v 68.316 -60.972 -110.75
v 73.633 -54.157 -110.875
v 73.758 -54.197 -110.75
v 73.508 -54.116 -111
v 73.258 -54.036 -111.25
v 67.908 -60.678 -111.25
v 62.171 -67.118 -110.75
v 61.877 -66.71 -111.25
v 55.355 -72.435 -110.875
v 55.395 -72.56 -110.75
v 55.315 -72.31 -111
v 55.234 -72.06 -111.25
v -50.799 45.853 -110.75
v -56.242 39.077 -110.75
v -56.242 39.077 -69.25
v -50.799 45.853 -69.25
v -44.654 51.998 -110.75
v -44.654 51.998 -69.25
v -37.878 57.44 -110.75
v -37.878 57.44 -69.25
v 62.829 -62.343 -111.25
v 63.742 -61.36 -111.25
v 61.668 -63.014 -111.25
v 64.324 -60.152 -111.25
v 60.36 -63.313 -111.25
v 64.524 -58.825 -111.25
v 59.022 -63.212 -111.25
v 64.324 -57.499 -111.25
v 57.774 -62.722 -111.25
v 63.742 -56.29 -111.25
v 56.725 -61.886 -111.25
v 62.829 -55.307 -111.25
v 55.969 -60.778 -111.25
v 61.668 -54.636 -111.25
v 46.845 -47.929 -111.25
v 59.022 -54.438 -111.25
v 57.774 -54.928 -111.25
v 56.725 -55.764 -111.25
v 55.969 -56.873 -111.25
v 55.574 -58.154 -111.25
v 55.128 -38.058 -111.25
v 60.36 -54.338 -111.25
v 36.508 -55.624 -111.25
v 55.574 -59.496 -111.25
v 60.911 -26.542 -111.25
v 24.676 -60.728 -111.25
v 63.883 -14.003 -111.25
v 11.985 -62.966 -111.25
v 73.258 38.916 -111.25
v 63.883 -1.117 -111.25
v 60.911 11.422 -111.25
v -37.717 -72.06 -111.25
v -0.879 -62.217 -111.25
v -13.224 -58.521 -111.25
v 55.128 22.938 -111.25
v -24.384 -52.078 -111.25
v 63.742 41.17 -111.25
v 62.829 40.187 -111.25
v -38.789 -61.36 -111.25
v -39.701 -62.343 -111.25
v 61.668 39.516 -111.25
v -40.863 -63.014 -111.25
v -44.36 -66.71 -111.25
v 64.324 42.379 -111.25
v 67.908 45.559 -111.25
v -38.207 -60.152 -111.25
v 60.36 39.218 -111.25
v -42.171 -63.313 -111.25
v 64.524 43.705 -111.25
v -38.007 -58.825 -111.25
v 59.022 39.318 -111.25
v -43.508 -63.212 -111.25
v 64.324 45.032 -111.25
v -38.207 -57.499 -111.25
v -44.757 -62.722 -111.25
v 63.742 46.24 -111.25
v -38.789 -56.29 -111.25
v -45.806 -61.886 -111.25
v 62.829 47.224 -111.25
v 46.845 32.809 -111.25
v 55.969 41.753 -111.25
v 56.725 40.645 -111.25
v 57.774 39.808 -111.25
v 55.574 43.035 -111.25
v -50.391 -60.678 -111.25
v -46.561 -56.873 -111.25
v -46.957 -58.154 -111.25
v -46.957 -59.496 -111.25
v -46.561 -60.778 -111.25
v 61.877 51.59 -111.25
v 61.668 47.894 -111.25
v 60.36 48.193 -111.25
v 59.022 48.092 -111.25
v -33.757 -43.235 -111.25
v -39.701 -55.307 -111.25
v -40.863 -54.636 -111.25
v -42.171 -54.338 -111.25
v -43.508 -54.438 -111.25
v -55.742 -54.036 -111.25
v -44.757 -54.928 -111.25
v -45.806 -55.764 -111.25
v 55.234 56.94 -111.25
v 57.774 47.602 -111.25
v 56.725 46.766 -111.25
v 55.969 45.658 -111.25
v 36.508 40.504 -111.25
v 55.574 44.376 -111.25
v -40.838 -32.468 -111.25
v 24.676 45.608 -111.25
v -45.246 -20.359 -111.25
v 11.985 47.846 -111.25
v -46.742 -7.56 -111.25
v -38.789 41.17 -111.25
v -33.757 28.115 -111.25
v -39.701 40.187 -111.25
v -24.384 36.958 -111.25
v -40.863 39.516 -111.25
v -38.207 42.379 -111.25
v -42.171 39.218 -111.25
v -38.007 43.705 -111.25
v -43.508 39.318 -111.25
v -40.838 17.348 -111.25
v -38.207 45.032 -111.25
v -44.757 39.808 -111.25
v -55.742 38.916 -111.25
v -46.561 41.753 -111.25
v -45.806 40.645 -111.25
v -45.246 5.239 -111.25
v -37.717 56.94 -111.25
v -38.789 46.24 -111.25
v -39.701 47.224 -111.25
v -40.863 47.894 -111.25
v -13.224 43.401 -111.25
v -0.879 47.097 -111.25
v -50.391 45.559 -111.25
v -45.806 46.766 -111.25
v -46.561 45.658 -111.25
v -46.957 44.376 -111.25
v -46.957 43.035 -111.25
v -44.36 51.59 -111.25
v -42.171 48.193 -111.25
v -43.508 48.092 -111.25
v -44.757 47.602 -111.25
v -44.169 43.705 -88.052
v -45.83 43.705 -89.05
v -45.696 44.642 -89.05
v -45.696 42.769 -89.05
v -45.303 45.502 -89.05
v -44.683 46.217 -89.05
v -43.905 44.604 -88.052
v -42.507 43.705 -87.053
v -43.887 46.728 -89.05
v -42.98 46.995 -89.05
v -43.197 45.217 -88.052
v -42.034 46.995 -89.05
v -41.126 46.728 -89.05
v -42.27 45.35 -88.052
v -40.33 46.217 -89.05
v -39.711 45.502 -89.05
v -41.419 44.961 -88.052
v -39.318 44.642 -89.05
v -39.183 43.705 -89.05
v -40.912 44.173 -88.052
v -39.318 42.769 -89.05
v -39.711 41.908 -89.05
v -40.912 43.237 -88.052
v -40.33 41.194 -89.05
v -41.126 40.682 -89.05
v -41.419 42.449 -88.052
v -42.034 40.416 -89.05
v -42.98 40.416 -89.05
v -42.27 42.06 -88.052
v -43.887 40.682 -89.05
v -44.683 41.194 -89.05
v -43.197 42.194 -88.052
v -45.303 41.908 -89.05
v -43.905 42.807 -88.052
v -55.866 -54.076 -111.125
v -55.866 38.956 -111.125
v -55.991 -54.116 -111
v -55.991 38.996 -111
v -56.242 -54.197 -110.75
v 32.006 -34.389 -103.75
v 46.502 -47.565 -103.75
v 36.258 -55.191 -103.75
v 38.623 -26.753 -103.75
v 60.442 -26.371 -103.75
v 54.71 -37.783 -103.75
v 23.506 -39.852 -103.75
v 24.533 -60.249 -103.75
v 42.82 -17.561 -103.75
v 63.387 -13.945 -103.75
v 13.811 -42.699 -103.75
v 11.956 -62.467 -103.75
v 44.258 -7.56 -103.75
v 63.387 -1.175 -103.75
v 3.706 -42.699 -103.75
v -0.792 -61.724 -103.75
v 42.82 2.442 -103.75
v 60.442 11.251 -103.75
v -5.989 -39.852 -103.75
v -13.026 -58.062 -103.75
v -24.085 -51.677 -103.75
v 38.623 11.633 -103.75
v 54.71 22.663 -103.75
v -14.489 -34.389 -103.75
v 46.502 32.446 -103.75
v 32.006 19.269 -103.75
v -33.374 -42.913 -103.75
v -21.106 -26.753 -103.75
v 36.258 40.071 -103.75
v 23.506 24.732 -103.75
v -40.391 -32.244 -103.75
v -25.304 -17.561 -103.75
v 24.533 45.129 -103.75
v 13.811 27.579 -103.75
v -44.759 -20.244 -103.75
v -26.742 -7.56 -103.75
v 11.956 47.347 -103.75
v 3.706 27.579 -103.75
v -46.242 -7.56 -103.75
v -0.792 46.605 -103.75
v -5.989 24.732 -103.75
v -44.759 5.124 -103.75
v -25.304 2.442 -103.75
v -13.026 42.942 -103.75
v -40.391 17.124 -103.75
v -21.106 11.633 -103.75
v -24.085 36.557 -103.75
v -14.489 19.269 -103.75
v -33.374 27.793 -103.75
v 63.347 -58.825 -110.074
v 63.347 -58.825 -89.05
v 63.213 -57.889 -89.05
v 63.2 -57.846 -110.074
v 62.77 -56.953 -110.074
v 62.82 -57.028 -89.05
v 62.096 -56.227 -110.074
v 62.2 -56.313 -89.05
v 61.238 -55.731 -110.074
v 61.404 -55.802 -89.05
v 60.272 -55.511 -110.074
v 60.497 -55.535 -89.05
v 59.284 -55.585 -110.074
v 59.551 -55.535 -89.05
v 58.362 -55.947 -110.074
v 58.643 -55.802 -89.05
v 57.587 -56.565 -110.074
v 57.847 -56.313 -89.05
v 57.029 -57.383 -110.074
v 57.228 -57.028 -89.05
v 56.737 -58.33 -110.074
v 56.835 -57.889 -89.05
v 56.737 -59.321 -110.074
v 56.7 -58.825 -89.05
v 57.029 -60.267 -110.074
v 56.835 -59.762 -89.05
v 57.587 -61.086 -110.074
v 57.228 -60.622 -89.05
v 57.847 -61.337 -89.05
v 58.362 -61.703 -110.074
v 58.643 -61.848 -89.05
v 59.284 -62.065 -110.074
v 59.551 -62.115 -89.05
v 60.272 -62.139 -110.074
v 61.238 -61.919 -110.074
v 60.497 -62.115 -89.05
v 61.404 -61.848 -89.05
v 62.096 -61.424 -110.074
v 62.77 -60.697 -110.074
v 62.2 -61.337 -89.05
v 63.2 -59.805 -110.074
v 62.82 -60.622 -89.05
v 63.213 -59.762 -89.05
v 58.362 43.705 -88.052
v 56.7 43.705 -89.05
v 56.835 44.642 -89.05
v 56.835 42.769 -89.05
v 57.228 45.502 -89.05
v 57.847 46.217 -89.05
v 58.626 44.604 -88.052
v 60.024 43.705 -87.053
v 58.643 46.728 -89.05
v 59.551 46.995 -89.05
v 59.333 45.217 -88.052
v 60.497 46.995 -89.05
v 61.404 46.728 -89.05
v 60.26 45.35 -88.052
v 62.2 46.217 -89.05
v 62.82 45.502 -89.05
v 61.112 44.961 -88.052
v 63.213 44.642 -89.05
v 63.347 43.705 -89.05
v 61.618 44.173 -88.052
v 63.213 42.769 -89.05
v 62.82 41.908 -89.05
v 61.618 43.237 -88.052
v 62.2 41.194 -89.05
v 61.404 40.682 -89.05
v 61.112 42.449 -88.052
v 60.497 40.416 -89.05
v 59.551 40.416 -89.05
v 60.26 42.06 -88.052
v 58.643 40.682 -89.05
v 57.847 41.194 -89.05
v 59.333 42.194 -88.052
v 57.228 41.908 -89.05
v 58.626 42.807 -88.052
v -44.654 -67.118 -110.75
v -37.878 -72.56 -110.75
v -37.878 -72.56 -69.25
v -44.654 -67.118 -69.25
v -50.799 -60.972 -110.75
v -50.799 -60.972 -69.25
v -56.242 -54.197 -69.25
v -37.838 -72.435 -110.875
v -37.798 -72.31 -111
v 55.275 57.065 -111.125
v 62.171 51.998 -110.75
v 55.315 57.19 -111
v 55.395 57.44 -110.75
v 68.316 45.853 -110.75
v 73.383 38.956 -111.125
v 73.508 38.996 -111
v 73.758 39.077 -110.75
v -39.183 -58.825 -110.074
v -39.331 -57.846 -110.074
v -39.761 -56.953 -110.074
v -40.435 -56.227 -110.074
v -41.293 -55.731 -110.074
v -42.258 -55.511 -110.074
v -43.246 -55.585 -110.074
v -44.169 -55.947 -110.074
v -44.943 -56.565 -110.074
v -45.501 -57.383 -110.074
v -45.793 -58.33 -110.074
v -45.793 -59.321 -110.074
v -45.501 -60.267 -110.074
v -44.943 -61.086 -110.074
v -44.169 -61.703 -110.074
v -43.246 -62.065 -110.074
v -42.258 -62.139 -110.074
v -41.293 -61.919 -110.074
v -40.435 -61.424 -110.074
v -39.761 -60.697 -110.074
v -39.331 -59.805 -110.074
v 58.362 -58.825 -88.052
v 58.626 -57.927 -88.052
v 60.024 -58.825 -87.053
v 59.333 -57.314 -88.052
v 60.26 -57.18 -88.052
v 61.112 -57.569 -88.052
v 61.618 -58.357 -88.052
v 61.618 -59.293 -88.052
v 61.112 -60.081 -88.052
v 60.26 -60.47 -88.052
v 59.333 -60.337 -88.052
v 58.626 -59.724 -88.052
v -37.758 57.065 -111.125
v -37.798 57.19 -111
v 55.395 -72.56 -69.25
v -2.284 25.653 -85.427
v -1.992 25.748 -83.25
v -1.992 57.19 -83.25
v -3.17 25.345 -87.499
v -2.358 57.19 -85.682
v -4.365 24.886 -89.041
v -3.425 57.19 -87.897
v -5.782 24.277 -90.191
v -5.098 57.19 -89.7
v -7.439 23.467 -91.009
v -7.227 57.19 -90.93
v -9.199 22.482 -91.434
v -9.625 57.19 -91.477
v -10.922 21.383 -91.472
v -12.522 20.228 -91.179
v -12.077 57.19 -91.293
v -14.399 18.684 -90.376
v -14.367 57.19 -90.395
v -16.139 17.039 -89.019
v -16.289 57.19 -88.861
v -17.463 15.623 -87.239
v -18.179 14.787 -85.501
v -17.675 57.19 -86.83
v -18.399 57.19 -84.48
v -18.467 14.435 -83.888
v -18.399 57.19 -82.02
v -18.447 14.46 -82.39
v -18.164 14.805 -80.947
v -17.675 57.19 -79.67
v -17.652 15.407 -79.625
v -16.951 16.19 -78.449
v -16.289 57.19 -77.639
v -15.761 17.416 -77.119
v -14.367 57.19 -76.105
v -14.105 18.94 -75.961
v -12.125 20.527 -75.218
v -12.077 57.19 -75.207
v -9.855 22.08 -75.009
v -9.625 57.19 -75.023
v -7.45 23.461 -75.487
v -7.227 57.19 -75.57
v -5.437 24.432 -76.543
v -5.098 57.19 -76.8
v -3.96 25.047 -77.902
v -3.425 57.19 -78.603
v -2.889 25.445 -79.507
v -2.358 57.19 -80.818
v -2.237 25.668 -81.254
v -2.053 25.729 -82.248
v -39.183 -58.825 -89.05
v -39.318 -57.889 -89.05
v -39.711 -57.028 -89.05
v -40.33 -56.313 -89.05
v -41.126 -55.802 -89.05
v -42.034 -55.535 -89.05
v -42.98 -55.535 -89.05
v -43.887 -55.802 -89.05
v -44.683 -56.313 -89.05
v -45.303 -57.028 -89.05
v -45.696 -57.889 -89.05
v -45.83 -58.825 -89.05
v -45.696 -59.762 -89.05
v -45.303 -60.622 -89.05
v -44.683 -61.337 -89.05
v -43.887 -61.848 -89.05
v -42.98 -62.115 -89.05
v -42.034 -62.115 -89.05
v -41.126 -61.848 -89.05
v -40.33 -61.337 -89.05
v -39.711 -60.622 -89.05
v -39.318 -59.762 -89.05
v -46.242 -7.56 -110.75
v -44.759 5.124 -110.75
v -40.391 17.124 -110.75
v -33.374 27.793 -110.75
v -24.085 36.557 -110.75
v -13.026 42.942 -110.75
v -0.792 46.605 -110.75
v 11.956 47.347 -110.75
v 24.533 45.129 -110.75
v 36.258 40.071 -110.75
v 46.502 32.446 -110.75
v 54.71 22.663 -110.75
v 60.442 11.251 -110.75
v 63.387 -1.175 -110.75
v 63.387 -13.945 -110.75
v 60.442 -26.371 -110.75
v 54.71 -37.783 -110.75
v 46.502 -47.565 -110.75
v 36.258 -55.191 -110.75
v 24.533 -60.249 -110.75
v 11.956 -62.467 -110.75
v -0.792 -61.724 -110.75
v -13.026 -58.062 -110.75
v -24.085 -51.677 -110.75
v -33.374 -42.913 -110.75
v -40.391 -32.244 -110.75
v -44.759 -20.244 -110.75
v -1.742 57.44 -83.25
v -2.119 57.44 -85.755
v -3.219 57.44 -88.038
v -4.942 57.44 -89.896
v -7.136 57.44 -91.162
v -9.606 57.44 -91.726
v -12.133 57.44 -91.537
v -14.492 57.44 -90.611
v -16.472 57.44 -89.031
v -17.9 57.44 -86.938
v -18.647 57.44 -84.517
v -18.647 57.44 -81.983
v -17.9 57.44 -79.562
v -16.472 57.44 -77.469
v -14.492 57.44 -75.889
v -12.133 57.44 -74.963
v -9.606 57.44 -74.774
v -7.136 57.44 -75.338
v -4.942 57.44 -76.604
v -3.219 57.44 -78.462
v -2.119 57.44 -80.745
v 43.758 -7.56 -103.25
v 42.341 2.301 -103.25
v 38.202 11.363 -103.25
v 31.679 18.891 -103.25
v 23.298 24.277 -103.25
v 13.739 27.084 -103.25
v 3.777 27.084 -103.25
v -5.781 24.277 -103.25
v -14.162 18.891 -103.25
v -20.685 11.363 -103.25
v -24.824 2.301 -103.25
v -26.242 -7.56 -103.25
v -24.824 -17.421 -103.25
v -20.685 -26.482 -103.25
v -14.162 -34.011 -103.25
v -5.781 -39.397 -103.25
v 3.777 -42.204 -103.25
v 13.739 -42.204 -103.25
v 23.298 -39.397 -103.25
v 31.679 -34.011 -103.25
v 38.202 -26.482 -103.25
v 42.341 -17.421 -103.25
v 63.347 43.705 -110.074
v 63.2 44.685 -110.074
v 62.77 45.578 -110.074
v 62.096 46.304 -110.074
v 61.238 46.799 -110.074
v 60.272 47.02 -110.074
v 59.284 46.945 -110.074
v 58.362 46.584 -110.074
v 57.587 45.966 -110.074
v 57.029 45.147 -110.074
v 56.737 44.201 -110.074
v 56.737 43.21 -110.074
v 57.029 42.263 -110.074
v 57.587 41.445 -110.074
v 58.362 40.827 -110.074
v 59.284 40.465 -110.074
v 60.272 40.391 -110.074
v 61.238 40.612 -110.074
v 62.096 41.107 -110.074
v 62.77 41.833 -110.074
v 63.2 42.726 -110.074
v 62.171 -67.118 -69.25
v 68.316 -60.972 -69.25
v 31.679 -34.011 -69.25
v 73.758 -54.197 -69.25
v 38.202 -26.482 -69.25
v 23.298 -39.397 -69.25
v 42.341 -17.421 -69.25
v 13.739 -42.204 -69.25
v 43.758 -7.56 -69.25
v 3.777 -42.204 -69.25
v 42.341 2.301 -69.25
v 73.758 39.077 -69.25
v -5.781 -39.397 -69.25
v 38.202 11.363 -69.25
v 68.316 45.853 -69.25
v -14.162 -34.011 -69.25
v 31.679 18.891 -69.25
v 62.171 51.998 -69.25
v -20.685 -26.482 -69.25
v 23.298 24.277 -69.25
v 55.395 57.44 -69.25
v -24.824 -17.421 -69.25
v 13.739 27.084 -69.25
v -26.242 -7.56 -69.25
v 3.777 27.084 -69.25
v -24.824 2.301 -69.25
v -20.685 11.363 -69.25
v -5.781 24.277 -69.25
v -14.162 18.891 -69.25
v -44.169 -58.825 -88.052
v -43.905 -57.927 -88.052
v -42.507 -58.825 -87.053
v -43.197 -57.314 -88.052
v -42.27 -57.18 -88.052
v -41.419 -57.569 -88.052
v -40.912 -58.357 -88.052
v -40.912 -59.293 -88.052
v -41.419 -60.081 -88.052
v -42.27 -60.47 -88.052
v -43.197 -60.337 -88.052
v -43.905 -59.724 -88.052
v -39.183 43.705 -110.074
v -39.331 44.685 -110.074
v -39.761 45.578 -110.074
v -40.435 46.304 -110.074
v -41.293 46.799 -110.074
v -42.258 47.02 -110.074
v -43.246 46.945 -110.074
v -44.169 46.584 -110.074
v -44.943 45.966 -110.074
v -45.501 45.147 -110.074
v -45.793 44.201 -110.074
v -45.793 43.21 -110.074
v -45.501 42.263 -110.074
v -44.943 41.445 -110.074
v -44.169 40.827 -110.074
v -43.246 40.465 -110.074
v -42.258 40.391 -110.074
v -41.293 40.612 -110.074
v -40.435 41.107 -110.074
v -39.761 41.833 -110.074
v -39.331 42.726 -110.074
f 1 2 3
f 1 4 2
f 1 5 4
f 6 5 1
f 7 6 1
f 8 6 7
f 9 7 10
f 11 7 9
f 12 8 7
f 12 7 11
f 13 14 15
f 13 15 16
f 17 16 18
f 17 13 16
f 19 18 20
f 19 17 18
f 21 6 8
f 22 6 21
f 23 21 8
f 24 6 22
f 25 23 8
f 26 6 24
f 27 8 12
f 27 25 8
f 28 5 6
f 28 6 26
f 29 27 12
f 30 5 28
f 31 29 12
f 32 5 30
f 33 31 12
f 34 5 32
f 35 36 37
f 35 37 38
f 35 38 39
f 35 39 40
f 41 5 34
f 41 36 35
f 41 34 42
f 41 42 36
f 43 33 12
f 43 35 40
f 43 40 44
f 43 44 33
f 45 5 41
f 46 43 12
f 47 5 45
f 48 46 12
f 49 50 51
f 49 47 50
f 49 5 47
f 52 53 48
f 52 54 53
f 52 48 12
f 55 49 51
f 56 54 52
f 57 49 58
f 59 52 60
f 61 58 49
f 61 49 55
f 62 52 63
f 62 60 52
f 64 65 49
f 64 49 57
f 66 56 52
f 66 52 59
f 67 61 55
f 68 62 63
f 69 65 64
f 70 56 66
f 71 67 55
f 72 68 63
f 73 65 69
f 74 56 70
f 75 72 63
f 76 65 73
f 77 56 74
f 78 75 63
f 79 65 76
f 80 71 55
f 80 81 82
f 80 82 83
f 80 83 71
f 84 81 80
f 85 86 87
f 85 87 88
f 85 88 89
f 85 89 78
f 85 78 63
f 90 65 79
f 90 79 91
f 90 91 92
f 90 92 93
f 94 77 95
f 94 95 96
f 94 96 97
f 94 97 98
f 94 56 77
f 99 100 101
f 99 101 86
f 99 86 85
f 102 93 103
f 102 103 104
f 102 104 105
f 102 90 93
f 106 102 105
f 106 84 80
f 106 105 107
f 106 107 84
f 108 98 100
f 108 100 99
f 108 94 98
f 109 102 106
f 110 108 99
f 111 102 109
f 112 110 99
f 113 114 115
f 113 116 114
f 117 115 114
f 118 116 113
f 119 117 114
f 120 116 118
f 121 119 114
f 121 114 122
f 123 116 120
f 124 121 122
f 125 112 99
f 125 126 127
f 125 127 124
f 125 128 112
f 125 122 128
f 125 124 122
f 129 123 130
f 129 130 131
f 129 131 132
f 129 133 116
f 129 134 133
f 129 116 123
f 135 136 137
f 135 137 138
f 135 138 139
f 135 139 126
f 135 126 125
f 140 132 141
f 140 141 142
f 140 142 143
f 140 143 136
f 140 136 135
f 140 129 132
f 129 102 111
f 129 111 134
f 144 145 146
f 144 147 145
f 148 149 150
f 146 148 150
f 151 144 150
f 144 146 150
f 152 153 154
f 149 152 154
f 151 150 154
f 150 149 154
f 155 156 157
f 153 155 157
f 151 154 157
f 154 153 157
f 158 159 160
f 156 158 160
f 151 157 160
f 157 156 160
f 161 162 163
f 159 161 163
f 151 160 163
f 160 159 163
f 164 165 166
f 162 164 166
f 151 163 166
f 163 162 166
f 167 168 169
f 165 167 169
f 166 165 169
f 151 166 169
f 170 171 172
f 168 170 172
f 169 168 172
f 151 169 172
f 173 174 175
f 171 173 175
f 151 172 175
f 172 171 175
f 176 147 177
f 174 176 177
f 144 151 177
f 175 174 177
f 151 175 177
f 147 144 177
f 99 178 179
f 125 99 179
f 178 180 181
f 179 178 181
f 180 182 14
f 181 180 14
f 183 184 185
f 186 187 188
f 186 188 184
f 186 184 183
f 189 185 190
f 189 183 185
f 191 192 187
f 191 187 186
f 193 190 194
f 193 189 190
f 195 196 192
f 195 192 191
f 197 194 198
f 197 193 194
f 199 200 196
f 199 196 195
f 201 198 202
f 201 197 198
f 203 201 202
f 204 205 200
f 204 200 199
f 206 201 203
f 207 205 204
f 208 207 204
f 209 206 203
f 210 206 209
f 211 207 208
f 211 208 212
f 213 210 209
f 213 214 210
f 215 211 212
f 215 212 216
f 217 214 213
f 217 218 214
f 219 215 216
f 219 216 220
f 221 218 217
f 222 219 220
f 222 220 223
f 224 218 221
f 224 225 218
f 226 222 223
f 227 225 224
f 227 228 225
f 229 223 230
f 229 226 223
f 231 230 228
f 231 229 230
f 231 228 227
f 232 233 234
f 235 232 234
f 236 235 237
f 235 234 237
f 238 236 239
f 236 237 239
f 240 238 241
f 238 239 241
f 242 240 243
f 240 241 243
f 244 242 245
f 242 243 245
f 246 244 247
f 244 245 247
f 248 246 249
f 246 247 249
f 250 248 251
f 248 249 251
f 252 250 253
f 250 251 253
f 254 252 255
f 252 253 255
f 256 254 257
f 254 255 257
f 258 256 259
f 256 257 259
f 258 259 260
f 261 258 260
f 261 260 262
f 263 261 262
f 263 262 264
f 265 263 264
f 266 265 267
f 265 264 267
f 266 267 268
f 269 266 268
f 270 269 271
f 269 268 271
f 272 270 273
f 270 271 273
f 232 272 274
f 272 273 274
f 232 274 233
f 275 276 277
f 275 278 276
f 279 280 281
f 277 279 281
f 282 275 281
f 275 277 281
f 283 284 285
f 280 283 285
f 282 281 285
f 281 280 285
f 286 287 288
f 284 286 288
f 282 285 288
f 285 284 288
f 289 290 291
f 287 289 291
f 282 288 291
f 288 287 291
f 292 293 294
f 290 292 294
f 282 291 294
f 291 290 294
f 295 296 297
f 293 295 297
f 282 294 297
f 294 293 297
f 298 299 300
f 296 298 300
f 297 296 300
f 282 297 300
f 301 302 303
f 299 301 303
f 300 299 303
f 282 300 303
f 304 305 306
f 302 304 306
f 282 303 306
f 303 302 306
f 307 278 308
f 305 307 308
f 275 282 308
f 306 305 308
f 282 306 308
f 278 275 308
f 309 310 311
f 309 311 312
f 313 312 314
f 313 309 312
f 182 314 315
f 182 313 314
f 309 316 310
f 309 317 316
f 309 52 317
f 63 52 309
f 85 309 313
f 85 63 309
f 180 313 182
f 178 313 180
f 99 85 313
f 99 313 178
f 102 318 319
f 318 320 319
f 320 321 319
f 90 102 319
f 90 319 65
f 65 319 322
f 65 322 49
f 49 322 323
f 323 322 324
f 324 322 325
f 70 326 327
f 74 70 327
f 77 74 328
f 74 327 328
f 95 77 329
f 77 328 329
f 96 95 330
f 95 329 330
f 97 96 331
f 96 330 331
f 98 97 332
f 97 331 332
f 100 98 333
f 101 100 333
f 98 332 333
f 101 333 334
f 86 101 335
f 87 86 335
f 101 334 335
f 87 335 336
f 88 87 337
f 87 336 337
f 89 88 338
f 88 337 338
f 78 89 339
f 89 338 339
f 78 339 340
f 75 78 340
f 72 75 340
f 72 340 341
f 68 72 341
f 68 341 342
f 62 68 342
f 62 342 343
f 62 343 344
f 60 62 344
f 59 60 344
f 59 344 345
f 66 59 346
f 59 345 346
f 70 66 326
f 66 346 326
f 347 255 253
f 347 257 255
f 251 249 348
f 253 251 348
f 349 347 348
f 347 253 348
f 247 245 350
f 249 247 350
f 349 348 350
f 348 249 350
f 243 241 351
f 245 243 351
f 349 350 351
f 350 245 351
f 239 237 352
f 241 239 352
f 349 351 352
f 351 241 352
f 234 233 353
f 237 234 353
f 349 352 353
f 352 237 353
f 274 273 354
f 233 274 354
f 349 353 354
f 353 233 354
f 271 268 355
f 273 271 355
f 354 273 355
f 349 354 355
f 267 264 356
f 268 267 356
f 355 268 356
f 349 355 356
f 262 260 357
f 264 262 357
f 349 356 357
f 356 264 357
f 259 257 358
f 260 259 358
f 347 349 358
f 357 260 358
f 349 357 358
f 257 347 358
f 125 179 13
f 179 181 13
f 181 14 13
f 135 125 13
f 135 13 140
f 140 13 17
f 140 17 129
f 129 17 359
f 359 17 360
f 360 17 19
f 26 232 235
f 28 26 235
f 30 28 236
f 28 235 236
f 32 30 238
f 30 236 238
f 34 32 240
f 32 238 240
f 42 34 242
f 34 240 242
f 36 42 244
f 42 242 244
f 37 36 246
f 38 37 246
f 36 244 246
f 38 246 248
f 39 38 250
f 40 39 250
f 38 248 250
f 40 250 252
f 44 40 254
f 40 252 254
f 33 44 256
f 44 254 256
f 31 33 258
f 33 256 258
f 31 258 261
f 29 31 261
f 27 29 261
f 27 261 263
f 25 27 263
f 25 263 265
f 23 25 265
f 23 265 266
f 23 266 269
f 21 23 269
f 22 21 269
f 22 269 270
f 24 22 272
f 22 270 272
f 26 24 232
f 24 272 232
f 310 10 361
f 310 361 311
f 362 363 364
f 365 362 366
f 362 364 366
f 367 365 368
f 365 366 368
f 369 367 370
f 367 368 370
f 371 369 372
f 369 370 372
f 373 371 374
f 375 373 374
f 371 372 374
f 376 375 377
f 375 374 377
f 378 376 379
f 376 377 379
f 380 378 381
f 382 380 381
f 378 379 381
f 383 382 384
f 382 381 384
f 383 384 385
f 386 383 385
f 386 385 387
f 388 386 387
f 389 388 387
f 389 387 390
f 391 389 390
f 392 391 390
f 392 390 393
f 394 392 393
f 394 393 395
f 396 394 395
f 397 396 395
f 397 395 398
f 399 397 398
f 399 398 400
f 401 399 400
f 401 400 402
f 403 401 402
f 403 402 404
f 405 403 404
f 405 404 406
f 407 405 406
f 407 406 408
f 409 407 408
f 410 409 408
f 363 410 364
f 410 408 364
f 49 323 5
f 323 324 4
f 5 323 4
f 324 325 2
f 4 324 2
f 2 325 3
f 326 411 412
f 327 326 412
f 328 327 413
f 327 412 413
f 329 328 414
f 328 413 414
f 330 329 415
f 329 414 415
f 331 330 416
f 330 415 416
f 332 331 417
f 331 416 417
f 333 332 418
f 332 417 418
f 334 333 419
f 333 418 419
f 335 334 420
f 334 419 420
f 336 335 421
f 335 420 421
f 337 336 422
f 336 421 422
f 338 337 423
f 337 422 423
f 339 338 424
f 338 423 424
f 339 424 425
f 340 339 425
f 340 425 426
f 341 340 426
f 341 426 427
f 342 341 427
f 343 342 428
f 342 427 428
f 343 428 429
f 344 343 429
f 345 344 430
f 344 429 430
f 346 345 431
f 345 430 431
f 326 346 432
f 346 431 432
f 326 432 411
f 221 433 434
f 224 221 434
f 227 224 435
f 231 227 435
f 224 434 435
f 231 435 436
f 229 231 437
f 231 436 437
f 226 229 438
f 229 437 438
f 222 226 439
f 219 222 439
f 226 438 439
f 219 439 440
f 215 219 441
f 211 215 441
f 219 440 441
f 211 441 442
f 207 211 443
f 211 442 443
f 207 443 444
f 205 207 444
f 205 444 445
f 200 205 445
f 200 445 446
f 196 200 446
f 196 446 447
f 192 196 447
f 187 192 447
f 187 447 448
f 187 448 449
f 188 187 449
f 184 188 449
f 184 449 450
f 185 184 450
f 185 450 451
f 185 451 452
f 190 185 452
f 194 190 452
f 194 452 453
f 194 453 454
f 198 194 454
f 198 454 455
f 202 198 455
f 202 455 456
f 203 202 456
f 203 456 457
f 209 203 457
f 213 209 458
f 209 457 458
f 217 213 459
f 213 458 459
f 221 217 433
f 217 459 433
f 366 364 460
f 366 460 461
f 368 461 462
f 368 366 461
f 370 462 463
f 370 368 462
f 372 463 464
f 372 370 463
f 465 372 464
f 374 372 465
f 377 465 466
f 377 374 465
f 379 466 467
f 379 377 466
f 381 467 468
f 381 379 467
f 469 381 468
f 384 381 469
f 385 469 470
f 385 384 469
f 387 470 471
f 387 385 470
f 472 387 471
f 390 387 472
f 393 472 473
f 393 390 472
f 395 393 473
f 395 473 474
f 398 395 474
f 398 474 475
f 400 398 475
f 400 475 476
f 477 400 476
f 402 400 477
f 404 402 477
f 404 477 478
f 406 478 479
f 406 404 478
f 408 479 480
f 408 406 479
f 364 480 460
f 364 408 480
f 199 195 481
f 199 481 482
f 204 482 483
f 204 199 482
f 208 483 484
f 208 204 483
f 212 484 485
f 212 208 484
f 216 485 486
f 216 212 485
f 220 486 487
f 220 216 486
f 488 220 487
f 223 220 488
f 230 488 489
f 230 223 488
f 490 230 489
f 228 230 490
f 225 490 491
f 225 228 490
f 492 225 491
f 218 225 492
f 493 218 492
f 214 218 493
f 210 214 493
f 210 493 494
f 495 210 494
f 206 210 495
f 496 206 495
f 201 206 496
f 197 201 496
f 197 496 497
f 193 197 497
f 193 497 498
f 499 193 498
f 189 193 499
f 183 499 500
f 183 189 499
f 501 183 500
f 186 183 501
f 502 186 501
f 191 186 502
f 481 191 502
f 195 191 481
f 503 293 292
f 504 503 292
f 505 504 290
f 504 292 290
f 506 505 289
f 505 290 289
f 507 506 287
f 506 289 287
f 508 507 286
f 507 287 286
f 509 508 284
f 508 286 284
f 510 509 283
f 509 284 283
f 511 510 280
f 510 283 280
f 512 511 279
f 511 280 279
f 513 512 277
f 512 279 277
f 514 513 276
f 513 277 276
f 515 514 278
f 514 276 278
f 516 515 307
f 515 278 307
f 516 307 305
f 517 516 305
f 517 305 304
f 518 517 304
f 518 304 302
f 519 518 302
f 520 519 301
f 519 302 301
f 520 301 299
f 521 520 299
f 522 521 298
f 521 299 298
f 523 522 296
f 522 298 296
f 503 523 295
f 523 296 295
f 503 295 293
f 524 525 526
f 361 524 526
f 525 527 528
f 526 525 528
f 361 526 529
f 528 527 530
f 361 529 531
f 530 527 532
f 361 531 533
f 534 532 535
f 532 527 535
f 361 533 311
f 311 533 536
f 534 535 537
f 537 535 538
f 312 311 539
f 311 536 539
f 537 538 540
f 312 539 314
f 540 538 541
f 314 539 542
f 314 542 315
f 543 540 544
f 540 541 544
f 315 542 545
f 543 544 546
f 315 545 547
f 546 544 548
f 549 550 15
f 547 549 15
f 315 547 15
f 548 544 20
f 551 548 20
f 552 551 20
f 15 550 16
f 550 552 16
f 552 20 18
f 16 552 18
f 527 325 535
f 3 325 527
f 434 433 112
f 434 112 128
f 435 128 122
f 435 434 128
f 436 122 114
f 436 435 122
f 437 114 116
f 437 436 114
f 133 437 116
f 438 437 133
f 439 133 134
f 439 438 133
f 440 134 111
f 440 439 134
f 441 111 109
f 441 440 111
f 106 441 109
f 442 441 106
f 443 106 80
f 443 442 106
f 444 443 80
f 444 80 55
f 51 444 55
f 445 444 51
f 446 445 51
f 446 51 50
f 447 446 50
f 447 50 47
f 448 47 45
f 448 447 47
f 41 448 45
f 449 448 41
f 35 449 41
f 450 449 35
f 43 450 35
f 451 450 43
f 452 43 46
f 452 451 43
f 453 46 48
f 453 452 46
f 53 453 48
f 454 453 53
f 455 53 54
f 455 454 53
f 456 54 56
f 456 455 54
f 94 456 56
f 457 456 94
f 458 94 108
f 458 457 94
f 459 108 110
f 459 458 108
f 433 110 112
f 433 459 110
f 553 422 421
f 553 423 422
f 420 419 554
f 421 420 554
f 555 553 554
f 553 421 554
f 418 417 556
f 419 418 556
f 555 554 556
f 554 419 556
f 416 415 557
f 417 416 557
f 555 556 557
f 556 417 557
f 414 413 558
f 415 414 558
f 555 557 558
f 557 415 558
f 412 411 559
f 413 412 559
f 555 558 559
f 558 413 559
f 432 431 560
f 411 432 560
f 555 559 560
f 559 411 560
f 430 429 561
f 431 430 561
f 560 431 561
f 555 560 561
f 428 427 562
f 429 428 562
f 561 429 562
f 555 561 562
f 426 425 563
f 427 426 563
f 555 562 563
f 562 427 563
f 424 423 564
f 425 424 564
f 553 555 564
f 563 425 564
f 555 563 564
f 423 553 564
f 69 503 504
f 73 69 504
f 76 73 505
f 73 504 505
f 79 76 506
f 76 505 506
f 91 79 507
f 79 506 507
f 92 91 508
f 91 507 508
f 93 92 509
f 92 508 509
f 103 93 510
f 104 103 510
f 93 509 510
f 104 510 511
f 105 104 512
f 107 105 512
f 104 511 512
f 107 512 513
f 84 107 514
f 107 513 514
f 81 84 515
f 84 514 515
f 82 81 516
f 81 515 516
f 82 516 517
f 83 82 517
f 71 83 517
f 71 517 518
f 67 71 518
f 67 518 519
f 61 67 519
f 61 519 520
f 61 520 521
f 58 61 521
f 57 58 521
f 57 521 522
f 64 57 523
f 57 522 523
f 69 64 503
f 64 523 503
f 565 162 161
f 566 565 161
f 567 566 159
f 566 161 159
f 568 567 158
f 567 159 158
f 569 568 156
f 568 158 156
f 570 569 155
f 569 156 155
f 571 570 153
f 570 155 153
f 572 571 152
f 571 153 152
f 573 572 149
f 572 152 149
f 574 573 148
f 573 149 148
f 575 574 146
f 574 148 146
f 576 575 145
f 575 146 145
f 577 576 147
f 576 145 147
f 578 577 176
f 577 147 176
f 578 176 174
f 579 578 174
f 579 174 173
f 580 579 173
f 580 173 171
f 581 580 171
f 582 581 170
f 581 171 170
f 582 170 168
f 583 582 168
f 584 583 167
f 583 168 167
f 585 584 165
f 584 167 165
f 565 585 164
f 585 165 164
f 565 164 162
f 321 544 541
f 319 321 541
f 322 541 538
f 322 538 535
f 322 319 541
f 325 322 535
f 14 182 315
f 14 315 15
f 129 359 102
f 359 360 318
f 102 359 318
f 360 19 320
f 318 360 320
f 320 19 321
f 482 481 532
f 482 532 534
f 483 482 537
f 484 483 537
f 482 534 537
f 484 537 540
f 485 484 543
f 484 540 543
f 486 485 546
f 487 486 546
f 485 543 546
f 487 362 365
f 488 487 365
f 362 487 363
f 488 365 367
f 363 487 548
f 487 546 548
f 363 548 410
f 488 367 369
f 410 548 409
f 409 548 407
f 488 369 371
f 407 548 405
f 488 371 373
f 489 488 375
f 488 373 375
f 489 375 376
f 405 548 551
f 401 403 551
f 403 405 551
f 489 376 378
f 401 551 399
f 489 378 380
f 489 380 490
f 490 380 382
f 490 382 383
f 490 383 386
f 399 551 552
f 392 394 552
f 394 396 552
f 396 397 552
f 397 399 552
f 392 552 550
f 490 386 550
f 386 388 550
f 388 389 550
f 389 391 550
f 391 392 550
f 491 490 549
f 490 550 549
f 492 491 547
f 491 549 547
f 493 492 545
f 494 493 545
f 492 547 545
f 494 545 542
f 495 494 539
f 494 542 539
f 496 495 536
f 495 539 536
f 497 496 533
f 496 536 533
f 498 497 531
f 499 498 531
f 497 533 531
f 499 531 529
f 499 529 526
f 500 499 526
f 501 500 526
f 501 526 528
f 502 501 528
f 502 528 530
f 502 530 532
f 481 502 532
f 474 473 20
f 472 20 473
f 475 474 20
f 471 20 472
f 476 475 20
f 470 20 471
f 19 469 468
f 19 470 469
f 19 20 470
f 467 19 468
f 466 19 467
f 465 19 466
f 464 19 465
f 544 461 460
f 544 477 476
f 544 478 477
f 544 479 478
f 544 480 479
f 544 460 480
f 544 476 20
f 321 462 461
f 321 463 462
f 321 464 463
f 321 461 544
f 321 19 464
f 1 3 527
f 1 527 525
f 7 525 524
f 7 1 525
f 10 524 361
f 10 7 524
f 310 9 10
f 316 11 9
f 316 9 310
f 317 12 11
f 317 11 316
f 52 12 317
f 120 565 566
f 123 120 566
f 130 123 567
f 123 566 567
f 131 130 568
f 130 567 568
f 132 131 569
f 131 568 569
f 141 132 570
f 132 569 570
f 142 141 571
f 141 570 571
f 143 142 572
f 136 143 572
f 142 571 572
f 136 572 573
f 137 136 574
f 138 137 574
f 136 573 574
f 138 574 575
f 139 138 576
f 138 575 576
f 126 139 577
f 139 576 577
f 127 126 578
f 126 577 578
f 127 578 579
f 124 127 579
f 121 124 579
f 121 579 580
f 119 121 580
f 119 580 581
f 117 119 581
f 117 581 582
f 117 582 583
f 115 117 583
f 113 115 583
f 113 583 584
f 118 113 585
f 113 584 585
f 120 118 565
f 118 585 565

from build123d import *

# Parameters (mm, degrees)
BOSS_EXTRUDE1_DEPTH                      = 42
CBORE_FOR_M64_HEX_HEAD_BOLT1_D           = 70
CBORE_FOR_M64_HEX_HEAD_BOLT1_CBORE_D     = 110
CBORE_FOR_M64_HEX_HEAD_BOLT1_CBORE_DEPTH = 7.5
F_16_5_16_5_DIAMETER_HOLE1_REACH         = 188.325
F_16_5_16_5_DIAMETER_HOLE1_BORE_R        = 8.25
M6_CLEARANCE_HOLE1_D                     = 6.647
M6_CLEARANCE_HOLE1_DEPTH                 = 22.2
M6_CLEARANCE_HOLE1_TIP                   = 1.996960267
CHAMFER1_SIZE                            = 0.5
CHAMFER2_SIZE                            = 1.1765
CHAMFER3_SIZE                            = 0.25


with BuildPart() as part:
    # Sketch1 → Boss-Extrude1 (new body)
    with BuildSketch(Plane(origin=(0, 0, -111.250000238), x_dir=(-1, 0, 0), z_dir=(0, 0, -1))):
        with BuildLine():
            Line((-55.395346272, -72.559925727), (37.878444259, -72.559925727))
            ThreePointArc((37.878444259, -72.559925727), (47.810091488, -64.128468222), (56.241548993, -54.196820993))
            Line((56.241548993, -54.196820993), (56.241548993, 39.076969538))
            ThreePointArc((56.241548993, 39.076969538), (47.810091488, 49.008616768), (37.878444259, 57.440074273))
            Line((37.878444259, 57.440074273), (-55.395346272, 57.440074273))
            ThreePointArc((-55.395346272, 57.440074273), (-65.326993501, 49.008616768), (-73.758451007, 39.076969538))
            Line((-73.758451007, 39.076969538), (-73.758451007, -54.196820993))
            ThreePointArc((-73.758451007, -54.196820993), (-65.326993501, -64.128468222), (-55.395346272, -72.559925727))
        make_face()
    extrude(amount=-BOSS_EXTRUDE1_DEPTH)

    # CBORE for M64 Hex Head Bolt1 (through all)
    with Locations(Plane(origin=(0, 0, -111.250000238), x_dir=(-1, 0, 0), z_dir=(0, 0, -1))):
        with Locations((-8.758451007, -7.559925727)):
            CounterBoreHole(CBORE_FOR_M64_HEX_HEAD_BOLT1_D / 2, CBORE_FOR_M64_HEX_HEAD_BOLT1_CBORE_D / 2, CBORE_FOR_M64_HEX_HEAD_BOLT1_CBORE_DEPTH)

    # Ø16.5 (16.5) Diameter Hole1 bore → Ø16.5 (16.5) Diameter Hole1 (cut, up to next)
    with BuildSketch(Plane(origin=(0, 57.440074273, 0), x_dir=(1, 0, 0), z_dir=(0, 1, 0)), mode=Mode.PRIVATE) as f_16_5_16_5_diameter_hole1_sk1:
        with Locations((-10.241548993, 83.250000238)):
            Circle(F_16_5_16_5_DIAMETER_HOLE1_BORE_R)
    f_16_5_16_5_diameter_hole1_tool1 = extrude(f_16_5_16_5_diameter_hole1_sk1.sketch, amount=-F_16_5_16_5_DIAMETER_HOLE1_REACH, mode=Mode.PRIVATE) & part.part
    add(f_16_5_16_5_diameter_hole1_tool1.solids().sort_by_distance((-10.241549, 57.440074, -83.25))[0], mode=Mode.SUBTRACT)

    # M6 Clearance Hole1
    with Locations(Plane(origin=(0, 0, -111.250000238), x_dir=(-1, 0, 0), z_dir=(0, 0, -1))):
        with Locations((42.506790629, -58.825167363), (-60.023692643, -58.825167363), (-60.023692643, 43.705315909), (42.506790629, 43.705315909)):
            Hole(M6_CLEARANCE_HOLE1_D / 2, depth=M6_CLEARANCE_HOLE1_DEPTH)
            with Locations((0, 0, -(M6_CLEARANCE_HOLE1_DEPTH + M6_CLEARANCE_HOLE1_TIP / 2))):  # 118° drill point
                Cone(0, M6_CLEARANCE_HOLE1_D / 2, M6_CLEARANCE_HOLE1_TIP, mode=Mode.SUBTRACT)

    # Chamfer1
    chamfer1_edges = [part.edges().sort_by_distance(p)[0] for p in [
        (-56.241548993, -7.559925727, -111.250000238),
        (-47.810091488, -64.128468222, -111.250000238),
        (8.758451007, -72.559925727, -111.250000238),
        (65.326993501, -64.128468222, -111.250000238),
        (63.758451007, -7.559925727, -111.250000238),
        (-26.241548993, -7.559925727, -103.750000238),
        (73.758451007, -7.559925727, -111.250000238),
        (65.326993501, 49.008616768, -111.250000238),
        (8.758451007, 57.440074273, -111.250000238),
        (-47.810091488, 49.008616768, -111.250000238),
    ]]
    chamfer(chamfer1_edges, length=CHAMFER1_SIZE)

    # Chamfer2
    chamfer2_edges = [part.edges().sort_by_distance(p)[0] for p in [
        (-45.830290629, 43.705315909, -111.250000238),
        (56.700192643, 43.705315909, -111.250000238),
        (56.700192643, -58.825167363, -111.250000238),
        (-45.830290629, -58.825167363, -111.250000238),
    ]]
    chamfer(chamfer2_edges, length=CHAMFER2_SIZE)

    # Chamfer3
    chamfer3_edges = [part.edges().sort_by_distance(p)[0] for p in [
        (-18.491548993, 57.440074273, -83.250000238),
    ]]
    chamfer(chamfer3_edges, length=CHAMFER3_SIZE)


solid = part.part
